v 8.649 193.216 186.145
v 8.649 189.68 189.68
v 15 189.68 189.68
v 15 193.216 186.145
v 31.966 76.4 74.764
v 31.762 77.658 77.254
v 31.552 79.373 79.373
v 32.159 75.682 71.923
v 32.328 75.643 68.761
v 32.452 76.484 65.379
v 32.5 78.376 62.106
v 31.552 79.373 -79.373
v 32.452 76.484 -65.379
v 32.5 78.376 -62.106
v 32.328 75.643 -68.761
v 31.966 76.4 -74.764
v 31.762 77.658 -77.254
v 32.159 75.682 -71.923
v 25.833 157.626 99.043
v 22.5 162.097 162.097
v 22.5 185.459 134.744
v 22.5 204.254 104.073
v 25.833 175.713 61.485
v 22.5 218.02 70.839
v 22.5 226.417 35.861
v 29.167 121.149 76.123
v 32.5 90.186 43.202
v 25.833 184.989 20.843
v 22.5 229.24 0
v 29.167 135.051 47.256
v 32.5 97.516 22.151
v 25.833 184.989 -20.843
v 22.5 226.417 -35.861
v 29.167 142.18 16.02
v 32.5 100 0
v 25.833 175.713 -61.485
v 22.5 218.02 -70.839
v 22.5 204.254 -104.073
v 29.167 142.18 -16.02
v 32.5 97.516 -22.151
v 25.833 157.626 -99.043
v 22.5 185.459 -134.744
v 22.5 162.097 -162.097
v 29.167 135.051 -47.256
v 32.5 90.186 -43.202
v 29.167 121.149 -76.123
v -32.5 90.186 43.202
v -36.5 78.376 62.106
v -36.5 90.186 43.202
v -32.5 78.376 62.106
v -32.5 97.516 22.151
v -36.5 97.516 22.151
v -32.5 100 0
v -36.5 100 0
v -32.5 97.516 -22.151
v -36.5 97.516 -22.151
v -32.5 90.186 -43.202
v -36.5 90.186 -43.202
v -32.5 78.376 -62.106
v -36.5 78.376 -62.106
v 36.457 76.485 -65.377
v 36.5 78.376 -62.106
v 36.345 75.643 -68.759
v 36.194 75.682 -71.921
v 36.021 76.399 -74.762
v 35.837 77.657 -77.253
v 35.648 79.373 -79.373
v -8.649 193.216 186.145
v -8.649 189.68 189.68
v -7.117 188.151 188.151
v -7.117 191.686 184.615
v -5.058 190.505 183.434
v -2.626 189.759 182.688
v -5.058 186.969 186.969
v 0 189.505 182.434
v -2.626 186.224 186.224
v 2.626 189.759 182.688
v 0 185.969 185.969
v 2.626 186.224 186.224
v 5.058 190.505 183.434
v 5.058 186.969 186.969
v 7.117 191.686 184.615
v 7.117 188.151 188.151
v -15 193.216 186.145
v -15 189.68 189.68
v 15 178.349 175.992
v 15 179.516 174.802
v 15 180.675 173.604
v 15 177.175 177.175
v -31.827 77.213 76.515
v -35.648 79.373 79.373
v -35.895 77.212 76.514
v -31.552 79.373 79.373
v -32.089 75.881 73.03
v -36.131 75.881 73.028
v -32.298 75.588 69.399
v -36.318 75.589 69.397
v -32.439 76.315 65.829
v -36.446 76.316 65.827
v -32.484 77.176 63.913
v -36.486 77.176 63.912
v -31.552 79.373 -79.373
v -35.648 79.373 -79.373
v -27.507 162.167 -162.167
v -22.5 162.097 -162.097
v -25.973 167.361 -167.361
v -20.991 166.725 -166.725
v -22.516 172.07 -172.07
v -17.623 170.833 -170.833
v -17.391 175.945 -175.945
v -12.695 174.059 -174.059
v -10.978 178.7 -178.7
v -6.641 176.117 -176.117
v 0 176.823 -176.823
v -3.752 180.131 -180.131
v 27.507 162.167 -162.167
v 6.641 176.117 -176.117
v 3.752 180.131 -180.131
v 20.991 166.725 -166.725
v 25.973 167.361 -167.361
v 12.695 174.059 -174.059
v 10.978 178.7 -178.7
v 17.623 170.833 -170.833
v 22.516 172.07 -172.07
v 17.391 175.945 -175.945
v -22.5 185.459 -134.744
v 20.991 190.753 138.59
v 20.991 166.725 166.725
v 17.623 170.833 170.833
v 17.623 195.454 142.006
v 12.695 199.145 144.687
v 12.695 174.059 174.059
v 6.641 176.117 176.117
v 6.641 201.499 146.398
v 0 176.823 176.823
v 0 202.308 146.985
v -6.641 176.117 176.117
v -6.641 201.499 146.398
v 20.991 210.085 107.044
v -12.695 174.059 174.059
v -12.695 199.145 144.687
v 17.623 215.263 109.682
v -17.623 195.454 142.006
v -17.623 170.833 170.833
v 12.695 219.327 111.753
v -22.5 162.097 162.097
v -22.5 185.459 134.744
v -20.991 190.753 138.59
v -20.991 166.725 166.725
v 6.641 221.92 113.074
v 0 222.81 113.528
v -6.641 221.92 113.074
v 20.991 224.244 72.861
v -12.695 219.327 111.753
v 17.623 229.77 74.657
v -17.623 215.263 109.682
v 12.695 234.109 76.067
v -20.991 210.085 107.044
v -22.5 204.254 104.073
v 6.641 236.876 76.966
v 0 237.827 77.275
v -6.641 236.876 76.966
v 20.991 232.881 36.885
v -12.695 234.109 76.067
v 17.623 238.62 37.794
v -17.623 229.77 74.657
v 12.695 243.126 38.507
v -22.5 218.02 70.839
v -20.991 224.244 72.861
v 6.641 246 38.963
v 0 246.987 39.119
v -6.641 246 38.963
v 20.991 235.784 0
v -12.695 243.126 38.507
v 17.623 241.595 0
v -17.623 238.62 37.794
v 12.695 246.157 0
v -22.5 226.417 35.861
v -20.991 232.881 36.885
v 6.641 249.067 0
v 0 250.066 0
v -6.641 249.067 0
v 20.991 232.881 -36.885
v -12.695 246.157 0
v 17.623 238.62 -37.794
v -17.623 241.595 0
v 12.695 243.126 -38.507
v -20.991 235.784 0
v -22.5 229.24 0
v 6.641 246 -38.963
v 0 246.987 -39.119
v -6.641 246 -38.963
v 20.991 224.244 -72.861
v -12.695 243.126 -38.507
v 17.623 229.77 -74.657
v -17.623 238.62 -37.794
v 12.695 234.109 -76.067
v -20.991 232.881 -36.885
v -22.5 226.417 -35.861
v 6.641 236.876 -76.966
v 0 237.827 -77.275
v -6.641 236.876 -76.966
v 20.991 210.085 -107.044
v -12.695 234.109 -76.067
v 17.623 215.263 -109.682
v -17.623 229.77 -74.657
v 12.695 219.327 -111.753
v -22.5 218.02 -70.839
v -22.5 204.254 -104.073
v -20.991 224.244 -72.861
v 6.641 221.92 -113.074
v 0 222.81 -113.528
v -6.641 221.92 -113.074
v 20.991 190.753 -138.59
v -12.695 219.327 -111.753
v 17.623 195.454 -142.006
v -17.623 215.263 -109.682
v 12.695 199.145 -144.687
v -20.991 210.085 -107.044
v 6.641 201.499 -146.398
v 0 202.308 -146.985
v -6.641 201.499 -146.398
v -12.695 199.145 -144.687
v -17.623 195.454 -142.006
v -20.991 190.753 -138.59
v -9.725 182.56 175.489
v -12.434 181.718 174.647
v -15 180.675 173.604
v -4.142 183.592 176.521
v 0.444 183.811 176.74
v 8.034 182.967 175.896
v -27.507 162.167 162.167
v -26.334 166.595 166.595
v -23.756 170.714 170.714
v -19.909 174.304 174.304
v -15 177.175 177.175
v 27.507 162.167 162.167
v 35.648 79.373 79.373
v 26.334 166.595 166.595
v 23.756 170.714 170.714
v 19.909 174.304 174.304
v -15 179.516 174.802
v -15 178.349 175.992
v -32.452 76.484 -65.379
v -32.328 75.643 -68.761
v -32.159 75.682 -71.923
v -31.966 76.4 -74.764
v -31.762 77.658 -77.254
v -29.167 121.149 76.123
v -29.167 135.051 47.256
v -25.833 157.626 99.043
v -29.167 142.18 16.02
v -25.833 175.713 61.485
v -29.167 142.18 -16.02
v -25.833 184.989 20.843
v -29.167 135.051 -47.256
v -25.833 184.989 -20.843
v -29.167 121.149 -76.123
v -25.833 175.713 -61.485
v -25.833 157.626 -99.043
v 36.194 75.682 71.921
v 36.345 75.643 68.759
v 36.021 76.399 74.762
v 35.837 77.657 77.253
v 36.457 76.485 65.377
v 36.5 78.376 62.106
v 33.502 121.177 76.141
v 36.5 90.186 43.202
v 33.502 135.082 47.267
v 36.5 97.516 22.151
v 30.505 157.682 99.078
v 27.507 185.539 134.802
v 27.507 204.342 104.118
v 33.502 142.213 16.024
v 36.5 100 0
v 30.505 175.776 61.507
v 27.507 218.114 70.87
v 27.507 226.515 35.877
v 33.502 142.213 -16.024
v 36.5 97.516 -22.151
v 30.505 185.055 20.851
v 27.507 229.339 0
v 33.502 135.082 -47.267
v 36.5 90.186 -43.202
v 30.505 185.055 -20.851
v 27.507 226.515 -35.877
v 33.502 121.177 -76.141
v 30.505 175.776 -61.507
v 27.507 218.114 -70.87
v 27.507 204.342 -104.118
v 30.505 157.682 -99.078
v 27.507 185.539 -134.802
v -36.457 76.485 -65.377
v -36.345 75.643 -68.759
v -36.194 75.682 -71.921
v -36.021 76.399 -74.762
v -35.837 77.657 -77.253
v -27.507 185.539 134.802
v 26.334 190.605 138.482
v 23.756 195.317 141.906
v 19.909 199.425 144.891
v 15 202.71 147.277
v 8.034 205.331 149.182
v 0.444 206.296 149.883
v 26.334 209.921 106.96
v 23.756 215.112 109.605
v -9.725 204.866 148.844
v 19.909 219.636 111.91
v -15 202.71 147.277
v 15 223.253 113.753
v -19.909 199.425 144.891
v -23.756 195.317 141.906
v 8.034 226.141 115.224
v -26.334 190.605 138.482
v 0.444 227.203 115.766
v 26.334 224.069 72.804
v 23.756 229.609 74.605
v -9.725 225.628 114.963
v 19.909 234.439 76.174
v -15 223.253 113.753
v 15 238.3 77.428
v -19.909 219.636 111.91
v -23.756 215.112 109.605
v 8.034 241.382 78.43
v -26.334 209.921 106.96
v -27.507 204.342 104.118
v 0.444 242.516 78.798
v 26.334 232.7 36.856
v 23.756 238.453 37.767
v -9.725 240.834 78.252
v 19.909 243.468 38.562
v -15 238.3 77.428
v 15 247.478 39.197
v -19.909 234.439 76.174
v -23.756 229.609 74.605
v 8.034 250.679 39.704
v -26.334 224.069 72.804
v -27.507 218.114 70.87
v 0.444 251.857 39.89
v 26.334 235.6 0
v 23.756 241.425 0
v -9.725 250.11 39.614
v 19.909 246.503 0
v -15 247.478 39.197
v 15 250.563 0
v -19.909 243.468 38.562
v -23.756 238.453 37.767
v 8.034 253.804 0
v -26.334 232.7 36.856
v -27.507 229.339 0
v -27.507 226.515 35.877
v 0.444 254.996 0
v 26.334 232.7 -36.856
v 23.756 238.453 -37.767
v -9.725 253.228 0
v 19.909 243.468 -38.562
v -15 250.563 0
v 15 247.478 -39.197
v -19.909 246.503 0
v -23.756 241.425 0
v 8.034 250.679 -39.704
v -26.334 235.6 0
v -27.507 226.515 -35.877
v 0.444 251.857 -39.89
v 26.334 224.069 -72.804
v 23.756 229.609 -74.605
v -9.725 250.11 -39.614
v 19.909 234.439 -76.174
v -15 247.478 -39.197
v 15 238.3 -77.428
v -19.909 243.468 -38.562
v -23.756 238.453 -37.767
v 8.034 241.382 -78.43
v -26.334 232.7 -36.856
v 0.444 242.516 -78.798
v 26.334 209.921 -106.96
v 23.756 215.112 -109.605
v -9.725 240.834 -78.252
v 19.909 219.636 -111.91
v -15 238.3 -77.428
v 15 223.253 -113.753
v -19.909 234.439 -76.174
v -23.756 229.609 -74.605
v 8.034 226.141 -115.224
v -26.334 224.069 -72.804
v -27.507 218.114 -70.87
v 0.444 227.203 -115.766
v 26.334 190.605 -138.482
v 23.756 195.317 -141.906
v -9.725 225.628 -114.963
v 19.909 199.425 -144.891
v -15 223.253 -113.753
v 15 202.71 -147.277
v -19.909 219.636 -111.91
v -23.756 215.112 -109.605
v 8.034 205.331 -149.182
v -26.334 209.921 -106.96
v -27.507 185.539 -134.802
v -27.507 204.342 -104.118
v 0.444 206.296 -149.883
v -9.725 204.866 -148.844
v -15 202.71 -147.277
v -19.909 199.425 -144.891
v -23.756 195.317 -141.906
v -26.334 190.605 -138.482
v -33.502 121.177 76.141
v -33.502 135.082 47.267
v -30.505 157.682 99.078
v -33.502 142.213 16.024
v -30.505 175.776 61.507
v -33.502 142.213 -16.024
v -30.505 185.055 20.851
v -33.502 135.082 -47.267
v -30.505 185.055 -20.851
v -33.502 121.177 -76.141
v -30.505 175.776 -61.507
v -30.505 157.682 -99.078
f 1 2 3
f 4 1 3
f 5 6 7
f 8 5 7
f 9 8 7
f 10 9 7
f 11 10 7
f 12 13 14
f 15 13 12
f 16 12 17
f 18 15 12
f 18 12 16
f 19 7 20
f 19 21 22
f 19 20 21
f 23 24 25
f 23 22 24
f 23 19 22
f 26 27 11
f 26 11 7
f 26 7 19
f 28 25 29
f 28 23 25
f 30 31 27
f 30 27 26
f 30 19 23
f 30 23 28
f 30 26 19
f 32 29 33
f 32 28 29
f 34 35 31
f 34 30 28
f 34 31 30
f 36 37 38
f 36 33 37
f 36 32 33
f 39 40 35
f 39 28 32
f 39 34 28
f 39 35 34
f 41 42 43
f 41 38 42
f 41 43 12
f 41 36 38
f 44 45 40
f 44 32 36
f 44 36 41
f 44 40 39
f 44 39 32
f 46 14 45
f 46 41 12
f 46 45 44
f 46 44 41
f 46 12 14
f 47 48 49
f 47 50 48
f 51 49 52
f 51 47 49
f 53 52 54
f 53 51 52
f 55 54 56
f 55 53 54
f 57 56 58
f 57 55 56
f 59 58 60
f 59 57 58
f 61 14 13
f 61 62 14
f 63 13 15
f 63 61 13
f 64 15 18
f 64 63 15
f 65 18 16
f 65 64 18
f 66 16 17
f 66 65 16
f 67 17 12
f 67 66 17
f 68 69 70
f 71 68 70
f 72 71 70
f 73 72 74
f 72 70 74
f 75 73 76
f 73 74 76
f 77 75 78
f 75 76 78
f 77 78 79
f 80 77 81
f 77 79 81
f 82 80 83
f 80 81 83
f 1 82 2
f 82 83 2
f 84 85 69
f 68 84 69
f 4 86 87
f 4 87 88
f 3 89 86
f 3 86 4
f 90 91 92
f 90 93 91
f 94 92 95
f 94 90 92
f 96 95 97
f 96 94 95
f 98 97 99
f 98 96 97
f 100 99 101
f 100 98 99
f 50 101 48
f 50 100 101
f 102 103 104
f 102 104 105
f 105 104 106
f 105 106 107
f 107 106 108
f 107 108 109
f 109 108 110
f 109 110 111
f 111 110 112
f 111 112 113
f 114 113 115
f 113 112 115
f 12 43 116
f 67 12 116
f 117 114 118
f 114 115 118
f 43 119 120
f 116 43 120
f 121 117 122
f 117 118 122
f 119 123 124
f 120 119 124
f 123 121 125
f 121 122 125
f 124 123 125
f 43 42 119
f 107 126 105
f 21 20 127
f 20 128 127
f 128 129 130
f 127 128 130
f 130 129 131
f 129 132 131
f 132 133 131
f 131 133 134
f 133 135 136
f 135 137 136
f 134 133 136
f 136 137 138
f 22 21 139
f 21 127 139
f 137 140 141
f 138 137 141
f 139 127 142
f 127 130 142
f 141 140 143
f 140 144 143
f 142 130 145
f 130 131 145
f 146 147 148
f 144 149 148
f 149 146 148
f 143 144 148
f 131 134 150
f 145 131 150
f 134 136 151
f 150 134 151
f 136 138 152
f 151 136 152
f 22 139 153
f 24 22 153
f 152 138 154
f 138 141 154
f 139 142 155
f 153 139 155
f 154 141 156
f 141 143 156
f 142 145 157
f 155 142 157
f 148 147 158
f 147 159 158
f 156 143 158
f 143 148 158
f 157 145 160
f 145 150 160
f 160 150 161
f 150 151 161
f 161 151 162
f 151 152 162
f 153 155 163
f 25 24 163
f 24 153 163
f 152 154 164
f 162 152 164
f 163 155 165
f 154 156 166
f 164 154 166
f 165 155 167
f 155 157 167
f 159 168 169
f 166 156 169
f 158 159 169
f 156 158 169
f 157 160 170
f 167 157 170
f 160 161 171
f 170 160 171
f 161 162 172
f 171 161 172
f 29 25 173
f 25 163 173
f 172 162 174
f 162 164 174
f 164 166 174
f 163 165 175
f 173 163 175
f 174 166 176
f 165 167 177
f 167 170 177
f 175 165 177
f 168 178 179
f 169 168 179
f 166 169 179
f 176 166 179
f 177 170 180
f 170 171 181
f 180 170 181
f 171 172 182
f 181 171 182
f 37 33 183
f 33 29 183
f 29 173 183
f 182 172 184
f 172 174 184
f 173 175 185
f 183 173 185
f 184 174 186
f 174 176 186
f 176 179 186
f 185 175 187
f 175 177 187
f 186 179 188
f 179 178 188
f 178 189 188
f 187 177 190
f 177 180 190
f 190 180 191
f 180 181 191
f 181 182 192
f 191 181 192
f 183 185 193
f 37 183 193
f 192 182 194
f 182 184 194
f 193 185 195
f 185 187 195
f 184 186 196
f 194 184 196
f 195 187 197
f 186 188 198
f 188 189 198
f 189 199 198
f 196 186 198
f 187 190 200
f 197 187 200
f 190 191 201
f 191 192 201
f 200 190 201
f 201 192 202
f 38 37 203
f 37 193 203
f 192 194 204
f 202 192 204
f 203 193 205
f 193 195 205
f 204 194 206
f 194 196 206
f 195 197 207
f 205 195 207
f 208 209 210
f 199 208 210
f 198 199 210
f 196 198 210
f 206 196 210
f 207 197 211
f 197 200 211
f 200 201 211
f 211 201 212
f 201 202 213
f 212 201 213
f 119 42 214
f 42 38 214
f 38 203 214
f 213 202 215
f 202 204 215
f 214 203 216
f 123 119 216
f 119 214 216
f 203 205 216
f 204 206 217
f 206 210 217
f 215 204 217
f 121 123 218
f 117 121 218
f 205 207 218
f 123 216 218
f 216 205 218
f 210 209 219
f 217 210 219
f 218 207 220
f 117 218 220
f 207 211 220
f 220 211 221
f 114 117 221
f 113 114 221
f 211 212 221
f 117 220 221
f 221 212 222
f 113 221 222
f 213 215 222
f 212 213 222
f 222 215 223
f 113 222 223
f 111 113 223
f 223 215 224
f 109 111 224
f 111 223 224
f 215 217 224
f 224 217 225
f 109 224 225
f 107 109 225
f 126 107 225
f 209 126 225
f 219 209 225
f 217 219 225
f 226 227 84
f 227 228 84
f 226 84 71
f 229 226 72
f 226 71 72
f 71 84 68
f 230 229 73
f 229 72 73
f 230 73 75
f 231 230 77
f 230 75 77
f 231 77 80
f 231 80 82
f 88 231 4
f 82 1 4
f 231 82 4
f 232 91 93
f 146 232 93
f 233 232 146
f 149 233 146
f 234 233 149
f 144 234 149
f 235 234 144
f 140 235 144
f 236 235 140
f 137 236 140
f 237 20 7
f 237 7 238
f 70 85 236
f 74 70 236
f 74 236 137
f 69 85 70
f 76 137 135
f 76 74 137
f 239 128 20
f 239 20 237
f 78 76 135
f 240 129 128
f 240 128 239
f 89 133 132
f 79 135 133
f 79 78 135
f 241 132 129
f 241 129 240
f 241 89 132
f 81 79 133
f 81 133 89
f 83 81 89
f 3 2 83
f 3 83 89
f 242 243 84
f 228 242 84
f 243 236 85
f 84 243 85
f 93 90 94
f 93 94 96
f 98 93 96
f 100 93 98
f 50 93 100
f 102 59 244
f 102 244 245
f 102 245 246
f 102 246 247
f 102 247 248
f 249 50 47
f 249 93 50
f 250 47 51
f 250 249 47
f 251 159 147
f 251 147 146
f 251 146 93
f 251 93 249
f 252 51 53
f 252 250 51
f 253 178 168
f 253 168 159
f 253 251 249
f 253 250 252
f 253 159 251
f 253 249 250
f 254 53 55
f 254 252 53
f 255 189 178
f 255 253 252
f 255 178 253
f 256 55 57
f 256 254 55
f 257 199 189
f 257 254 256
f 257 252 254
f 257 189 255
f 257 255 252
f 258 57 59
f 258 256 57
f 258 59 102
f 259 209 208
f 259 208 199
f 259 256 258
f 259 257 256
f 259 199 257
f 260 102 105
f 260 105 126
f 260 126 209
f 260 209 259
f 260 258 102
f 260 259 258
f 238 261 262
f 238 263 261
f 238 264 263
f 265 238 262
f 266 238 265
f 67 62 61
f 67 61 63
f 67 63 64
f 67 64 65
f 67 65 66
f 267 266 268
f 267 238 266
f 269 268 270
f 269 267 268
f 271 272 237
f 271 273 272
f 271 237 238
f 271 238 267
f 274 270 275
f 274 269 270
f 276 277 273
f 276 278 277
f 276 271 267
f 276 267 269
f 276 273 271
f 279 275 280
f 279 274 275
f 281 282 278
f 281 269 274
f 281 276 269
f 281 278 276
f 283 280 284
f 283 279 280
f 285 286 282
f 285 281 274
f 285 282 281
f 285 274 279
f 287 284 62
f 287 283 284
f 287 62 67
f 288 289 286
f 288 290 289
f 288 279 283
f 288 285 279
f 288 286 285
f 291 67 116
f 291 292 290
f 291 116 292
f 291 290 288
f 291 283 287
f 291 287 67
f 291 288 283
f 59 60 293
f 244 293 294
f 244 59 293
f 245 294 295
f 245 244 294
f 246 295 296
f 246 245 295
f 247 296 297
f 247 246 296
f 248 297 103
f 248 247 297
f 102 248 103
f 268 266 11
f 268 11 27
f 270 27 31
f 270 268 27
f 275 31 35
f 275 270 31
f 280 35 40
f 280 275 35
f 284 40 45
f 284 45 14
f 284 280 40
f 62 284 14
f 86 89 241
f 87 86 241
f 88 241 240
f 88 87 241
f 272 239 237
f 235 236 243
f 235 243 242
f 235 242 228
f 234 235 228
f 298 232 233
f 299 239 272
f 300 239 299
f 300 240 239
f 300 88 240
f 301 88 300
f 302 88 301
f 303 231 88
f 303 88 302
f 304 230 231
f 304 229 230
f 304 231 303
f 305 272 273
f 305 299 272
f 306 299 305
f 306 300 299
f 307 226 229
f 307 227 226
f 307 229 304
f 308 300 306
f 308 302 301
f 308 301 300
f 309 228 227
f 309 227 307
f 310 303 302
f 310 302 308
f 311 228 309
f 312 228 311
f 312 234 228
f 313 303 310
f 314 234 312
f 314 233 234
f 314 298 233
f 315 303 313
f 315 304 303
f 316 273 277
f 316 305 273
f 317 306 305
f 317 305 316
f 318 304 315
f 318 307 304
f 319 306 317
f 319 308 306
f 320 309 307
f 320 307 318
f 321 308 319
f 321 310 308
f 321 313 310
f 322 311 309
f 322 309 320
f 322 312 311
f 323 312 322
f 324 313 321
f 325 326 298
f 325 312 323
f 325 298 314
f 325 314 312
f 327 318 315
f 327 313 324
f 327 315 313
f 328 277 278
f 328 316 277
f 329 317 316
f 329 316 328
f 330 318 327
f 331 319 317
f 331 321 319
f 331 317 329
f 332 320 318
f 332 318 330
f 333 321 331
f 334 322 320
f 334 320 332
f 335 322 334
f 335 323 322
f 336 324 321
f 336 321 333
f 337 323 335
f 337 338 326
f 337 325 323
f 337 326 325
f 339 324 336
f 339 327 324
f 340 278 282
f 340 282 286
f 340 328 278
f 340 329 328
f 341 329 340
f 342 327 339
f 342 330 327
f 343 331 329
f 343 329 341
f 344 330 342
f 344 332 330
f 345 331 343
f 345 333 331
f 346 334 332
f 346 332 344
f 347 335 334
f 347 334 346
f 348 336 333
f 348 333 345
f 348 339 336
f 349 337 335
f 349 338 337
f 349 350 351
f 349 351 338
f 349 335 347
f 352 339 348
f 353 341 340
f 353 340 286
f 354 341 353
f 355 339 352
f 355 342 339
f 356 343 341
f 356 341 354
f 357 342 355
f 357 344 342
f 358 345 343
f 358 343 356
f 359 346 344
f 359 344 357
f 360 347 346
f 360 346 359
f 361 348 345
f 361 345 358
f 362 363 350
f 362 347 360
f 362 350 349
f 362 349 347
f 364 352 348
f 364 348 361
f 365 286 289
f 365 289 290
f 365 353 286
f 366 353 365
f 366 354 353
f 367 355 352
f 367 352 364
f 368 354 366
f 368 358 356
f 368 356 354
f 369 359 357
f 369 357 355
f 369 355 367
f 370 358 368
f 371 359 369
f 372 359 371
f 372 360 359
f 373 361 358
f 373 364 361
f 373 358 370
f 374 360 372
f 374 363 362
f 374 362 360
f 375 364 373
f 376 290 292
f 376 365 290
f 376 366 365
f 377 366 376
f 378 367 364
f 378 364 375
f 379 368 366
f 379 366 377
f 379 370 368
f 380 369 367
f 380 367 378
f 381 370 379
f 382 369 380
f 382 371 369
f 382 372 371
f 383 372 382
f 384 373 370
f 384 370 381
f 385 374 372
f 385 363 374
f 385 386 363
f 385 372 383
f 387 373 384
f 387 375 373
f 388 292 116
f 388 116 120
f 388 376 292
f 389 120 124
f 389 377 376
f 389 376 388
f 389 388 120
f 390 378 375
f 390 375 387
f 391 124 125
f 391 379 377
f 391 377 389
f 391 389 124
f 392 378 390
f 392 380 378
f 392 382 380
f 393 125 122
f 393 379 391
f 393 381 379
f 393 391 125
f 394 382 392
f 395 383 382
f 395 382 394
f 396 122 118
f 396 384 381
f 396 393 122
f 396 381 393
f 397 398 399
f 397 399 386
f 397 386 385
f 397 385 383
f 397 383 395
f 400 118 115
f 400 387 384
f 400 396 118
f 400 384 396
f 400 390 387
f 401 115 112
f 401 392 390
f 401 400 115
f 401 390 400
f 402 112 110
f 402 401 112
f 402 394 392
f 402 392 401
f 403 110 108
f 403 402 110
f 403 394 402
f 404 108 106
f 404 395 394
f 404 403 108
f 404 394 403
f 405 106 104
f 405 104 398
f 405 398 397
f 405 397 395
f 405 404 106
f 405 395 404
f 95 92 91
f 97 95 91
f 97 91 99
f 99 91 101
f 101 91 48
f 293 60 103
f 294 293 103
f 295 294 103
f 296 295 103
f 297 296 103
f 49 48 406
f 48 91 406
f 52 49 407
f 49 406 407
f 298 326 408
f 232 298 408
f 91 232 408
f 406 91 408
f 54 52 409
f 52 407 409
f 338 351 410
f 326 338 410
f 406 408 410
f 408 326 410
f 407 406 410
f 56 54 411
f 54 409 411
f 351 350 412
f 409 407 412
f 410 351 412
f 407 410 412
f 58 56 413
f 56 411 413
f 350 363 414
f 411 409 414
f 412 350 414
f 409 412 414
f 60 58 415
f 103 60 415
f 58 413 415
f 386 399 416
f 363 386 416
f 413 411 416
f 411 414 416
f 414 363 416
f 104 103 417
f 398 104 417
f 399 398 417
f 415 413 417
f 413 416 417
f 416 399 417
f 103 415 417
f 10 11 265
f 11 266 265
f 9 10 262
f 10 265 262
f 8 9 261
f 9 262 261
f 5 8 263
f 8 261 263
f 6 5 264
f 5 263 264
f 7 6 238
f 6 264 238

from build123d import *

# Parameters (mm, degrees)
REVOLUTION_ANGLE = 90
SKETCH001_W      = 30
SKETCH001_H      = 18.068252
PAD_DEPTH        = 5
SKETCH002_R      = 9.75
POCKET_DEPTH     = 5
FILLET_R         = 13
FILLET001_R      = 13


with BuildPart() as part:
    # Sketch → Revolution (revolve, symmetric)
    with BuildSketch(Plane.XY) as revolution_sk:
        with BuildLine():
            ThreePointArc((27.507267, 229.338864), (0, 255), (-27.507267, 229.338864))
            Line((-36.5, 100), (-27.507267, 229.338864))
            Line((-36.5, 100), (-32.5, 100))
            Line((-32.5, 100), (-22.5, 229.239629))
            ThreePointArc((22.5, 229.239629), (0, 250.06593), (-22.5, 229.239629))
            Line((22.5, 229.239629), (32.5, 100))
            Line((32.5, 100), (36.5, 100))
            Line((36.5, 100), (27.507267, 229.338864))
        make_face()
    revolve(axis=Axis((0, 0, 0), (1, 0, 0)), revolution_arc=REVOLUTION_ANGLE / 2)
    revolve(revolution_sk.sketch, axis=Axis((0, 0, 0), (-1, 0, 0)), revolution_arc=REVOLUTION_ANGLE / 2)

    # Sketch001 (on Face1 of CopyFusion) → Pad (new body)
    with BuildSketch(Plane(origin=(0, 0, 0), x_dir=(1, 0, 0), z_dir=(0, -0.707107, 0.707107))):
        with Locations((0, 259.214452)):
            Rectangle(SKETCH001_W, SKETCH001_H)
    extrude(amount=-PAD_DEPTH)

    # Sketch002 (on Face15 of Pad) → Pocket (cut)
    with BuildSketch(Plane(origin=(0, 0, 0), x_dir=(1, 0, 0), z_dir=(0, -0.707107, 0.707107))):
        with Locations((0, 272.75)):
            Circle(SKETCH002_R)
    extrude(amount=-POCKET_DEPTH, mode=Mode.SUBTRACT)

    # Fillet
    fillet_edges = [part.edges().sort_by_distance(p)[0] for p in [
        (-34.5, 70.710678, -70.710678),
        (34.5, 70.710678, -70.710678),
    ]]
    fillet(fillet_edges, radius=FILLET_R)

    # Fillet001
    fillet001_edges = [part.edges().sort_by_distance(p)[0] for p in [
        (-34.5, 70.710678, 70.710678),
        (34.5, 70.710678, 70.710678),
    ]]
    fillet(fillet001_edges, radius=FILLET001_R)


solid = part.part
